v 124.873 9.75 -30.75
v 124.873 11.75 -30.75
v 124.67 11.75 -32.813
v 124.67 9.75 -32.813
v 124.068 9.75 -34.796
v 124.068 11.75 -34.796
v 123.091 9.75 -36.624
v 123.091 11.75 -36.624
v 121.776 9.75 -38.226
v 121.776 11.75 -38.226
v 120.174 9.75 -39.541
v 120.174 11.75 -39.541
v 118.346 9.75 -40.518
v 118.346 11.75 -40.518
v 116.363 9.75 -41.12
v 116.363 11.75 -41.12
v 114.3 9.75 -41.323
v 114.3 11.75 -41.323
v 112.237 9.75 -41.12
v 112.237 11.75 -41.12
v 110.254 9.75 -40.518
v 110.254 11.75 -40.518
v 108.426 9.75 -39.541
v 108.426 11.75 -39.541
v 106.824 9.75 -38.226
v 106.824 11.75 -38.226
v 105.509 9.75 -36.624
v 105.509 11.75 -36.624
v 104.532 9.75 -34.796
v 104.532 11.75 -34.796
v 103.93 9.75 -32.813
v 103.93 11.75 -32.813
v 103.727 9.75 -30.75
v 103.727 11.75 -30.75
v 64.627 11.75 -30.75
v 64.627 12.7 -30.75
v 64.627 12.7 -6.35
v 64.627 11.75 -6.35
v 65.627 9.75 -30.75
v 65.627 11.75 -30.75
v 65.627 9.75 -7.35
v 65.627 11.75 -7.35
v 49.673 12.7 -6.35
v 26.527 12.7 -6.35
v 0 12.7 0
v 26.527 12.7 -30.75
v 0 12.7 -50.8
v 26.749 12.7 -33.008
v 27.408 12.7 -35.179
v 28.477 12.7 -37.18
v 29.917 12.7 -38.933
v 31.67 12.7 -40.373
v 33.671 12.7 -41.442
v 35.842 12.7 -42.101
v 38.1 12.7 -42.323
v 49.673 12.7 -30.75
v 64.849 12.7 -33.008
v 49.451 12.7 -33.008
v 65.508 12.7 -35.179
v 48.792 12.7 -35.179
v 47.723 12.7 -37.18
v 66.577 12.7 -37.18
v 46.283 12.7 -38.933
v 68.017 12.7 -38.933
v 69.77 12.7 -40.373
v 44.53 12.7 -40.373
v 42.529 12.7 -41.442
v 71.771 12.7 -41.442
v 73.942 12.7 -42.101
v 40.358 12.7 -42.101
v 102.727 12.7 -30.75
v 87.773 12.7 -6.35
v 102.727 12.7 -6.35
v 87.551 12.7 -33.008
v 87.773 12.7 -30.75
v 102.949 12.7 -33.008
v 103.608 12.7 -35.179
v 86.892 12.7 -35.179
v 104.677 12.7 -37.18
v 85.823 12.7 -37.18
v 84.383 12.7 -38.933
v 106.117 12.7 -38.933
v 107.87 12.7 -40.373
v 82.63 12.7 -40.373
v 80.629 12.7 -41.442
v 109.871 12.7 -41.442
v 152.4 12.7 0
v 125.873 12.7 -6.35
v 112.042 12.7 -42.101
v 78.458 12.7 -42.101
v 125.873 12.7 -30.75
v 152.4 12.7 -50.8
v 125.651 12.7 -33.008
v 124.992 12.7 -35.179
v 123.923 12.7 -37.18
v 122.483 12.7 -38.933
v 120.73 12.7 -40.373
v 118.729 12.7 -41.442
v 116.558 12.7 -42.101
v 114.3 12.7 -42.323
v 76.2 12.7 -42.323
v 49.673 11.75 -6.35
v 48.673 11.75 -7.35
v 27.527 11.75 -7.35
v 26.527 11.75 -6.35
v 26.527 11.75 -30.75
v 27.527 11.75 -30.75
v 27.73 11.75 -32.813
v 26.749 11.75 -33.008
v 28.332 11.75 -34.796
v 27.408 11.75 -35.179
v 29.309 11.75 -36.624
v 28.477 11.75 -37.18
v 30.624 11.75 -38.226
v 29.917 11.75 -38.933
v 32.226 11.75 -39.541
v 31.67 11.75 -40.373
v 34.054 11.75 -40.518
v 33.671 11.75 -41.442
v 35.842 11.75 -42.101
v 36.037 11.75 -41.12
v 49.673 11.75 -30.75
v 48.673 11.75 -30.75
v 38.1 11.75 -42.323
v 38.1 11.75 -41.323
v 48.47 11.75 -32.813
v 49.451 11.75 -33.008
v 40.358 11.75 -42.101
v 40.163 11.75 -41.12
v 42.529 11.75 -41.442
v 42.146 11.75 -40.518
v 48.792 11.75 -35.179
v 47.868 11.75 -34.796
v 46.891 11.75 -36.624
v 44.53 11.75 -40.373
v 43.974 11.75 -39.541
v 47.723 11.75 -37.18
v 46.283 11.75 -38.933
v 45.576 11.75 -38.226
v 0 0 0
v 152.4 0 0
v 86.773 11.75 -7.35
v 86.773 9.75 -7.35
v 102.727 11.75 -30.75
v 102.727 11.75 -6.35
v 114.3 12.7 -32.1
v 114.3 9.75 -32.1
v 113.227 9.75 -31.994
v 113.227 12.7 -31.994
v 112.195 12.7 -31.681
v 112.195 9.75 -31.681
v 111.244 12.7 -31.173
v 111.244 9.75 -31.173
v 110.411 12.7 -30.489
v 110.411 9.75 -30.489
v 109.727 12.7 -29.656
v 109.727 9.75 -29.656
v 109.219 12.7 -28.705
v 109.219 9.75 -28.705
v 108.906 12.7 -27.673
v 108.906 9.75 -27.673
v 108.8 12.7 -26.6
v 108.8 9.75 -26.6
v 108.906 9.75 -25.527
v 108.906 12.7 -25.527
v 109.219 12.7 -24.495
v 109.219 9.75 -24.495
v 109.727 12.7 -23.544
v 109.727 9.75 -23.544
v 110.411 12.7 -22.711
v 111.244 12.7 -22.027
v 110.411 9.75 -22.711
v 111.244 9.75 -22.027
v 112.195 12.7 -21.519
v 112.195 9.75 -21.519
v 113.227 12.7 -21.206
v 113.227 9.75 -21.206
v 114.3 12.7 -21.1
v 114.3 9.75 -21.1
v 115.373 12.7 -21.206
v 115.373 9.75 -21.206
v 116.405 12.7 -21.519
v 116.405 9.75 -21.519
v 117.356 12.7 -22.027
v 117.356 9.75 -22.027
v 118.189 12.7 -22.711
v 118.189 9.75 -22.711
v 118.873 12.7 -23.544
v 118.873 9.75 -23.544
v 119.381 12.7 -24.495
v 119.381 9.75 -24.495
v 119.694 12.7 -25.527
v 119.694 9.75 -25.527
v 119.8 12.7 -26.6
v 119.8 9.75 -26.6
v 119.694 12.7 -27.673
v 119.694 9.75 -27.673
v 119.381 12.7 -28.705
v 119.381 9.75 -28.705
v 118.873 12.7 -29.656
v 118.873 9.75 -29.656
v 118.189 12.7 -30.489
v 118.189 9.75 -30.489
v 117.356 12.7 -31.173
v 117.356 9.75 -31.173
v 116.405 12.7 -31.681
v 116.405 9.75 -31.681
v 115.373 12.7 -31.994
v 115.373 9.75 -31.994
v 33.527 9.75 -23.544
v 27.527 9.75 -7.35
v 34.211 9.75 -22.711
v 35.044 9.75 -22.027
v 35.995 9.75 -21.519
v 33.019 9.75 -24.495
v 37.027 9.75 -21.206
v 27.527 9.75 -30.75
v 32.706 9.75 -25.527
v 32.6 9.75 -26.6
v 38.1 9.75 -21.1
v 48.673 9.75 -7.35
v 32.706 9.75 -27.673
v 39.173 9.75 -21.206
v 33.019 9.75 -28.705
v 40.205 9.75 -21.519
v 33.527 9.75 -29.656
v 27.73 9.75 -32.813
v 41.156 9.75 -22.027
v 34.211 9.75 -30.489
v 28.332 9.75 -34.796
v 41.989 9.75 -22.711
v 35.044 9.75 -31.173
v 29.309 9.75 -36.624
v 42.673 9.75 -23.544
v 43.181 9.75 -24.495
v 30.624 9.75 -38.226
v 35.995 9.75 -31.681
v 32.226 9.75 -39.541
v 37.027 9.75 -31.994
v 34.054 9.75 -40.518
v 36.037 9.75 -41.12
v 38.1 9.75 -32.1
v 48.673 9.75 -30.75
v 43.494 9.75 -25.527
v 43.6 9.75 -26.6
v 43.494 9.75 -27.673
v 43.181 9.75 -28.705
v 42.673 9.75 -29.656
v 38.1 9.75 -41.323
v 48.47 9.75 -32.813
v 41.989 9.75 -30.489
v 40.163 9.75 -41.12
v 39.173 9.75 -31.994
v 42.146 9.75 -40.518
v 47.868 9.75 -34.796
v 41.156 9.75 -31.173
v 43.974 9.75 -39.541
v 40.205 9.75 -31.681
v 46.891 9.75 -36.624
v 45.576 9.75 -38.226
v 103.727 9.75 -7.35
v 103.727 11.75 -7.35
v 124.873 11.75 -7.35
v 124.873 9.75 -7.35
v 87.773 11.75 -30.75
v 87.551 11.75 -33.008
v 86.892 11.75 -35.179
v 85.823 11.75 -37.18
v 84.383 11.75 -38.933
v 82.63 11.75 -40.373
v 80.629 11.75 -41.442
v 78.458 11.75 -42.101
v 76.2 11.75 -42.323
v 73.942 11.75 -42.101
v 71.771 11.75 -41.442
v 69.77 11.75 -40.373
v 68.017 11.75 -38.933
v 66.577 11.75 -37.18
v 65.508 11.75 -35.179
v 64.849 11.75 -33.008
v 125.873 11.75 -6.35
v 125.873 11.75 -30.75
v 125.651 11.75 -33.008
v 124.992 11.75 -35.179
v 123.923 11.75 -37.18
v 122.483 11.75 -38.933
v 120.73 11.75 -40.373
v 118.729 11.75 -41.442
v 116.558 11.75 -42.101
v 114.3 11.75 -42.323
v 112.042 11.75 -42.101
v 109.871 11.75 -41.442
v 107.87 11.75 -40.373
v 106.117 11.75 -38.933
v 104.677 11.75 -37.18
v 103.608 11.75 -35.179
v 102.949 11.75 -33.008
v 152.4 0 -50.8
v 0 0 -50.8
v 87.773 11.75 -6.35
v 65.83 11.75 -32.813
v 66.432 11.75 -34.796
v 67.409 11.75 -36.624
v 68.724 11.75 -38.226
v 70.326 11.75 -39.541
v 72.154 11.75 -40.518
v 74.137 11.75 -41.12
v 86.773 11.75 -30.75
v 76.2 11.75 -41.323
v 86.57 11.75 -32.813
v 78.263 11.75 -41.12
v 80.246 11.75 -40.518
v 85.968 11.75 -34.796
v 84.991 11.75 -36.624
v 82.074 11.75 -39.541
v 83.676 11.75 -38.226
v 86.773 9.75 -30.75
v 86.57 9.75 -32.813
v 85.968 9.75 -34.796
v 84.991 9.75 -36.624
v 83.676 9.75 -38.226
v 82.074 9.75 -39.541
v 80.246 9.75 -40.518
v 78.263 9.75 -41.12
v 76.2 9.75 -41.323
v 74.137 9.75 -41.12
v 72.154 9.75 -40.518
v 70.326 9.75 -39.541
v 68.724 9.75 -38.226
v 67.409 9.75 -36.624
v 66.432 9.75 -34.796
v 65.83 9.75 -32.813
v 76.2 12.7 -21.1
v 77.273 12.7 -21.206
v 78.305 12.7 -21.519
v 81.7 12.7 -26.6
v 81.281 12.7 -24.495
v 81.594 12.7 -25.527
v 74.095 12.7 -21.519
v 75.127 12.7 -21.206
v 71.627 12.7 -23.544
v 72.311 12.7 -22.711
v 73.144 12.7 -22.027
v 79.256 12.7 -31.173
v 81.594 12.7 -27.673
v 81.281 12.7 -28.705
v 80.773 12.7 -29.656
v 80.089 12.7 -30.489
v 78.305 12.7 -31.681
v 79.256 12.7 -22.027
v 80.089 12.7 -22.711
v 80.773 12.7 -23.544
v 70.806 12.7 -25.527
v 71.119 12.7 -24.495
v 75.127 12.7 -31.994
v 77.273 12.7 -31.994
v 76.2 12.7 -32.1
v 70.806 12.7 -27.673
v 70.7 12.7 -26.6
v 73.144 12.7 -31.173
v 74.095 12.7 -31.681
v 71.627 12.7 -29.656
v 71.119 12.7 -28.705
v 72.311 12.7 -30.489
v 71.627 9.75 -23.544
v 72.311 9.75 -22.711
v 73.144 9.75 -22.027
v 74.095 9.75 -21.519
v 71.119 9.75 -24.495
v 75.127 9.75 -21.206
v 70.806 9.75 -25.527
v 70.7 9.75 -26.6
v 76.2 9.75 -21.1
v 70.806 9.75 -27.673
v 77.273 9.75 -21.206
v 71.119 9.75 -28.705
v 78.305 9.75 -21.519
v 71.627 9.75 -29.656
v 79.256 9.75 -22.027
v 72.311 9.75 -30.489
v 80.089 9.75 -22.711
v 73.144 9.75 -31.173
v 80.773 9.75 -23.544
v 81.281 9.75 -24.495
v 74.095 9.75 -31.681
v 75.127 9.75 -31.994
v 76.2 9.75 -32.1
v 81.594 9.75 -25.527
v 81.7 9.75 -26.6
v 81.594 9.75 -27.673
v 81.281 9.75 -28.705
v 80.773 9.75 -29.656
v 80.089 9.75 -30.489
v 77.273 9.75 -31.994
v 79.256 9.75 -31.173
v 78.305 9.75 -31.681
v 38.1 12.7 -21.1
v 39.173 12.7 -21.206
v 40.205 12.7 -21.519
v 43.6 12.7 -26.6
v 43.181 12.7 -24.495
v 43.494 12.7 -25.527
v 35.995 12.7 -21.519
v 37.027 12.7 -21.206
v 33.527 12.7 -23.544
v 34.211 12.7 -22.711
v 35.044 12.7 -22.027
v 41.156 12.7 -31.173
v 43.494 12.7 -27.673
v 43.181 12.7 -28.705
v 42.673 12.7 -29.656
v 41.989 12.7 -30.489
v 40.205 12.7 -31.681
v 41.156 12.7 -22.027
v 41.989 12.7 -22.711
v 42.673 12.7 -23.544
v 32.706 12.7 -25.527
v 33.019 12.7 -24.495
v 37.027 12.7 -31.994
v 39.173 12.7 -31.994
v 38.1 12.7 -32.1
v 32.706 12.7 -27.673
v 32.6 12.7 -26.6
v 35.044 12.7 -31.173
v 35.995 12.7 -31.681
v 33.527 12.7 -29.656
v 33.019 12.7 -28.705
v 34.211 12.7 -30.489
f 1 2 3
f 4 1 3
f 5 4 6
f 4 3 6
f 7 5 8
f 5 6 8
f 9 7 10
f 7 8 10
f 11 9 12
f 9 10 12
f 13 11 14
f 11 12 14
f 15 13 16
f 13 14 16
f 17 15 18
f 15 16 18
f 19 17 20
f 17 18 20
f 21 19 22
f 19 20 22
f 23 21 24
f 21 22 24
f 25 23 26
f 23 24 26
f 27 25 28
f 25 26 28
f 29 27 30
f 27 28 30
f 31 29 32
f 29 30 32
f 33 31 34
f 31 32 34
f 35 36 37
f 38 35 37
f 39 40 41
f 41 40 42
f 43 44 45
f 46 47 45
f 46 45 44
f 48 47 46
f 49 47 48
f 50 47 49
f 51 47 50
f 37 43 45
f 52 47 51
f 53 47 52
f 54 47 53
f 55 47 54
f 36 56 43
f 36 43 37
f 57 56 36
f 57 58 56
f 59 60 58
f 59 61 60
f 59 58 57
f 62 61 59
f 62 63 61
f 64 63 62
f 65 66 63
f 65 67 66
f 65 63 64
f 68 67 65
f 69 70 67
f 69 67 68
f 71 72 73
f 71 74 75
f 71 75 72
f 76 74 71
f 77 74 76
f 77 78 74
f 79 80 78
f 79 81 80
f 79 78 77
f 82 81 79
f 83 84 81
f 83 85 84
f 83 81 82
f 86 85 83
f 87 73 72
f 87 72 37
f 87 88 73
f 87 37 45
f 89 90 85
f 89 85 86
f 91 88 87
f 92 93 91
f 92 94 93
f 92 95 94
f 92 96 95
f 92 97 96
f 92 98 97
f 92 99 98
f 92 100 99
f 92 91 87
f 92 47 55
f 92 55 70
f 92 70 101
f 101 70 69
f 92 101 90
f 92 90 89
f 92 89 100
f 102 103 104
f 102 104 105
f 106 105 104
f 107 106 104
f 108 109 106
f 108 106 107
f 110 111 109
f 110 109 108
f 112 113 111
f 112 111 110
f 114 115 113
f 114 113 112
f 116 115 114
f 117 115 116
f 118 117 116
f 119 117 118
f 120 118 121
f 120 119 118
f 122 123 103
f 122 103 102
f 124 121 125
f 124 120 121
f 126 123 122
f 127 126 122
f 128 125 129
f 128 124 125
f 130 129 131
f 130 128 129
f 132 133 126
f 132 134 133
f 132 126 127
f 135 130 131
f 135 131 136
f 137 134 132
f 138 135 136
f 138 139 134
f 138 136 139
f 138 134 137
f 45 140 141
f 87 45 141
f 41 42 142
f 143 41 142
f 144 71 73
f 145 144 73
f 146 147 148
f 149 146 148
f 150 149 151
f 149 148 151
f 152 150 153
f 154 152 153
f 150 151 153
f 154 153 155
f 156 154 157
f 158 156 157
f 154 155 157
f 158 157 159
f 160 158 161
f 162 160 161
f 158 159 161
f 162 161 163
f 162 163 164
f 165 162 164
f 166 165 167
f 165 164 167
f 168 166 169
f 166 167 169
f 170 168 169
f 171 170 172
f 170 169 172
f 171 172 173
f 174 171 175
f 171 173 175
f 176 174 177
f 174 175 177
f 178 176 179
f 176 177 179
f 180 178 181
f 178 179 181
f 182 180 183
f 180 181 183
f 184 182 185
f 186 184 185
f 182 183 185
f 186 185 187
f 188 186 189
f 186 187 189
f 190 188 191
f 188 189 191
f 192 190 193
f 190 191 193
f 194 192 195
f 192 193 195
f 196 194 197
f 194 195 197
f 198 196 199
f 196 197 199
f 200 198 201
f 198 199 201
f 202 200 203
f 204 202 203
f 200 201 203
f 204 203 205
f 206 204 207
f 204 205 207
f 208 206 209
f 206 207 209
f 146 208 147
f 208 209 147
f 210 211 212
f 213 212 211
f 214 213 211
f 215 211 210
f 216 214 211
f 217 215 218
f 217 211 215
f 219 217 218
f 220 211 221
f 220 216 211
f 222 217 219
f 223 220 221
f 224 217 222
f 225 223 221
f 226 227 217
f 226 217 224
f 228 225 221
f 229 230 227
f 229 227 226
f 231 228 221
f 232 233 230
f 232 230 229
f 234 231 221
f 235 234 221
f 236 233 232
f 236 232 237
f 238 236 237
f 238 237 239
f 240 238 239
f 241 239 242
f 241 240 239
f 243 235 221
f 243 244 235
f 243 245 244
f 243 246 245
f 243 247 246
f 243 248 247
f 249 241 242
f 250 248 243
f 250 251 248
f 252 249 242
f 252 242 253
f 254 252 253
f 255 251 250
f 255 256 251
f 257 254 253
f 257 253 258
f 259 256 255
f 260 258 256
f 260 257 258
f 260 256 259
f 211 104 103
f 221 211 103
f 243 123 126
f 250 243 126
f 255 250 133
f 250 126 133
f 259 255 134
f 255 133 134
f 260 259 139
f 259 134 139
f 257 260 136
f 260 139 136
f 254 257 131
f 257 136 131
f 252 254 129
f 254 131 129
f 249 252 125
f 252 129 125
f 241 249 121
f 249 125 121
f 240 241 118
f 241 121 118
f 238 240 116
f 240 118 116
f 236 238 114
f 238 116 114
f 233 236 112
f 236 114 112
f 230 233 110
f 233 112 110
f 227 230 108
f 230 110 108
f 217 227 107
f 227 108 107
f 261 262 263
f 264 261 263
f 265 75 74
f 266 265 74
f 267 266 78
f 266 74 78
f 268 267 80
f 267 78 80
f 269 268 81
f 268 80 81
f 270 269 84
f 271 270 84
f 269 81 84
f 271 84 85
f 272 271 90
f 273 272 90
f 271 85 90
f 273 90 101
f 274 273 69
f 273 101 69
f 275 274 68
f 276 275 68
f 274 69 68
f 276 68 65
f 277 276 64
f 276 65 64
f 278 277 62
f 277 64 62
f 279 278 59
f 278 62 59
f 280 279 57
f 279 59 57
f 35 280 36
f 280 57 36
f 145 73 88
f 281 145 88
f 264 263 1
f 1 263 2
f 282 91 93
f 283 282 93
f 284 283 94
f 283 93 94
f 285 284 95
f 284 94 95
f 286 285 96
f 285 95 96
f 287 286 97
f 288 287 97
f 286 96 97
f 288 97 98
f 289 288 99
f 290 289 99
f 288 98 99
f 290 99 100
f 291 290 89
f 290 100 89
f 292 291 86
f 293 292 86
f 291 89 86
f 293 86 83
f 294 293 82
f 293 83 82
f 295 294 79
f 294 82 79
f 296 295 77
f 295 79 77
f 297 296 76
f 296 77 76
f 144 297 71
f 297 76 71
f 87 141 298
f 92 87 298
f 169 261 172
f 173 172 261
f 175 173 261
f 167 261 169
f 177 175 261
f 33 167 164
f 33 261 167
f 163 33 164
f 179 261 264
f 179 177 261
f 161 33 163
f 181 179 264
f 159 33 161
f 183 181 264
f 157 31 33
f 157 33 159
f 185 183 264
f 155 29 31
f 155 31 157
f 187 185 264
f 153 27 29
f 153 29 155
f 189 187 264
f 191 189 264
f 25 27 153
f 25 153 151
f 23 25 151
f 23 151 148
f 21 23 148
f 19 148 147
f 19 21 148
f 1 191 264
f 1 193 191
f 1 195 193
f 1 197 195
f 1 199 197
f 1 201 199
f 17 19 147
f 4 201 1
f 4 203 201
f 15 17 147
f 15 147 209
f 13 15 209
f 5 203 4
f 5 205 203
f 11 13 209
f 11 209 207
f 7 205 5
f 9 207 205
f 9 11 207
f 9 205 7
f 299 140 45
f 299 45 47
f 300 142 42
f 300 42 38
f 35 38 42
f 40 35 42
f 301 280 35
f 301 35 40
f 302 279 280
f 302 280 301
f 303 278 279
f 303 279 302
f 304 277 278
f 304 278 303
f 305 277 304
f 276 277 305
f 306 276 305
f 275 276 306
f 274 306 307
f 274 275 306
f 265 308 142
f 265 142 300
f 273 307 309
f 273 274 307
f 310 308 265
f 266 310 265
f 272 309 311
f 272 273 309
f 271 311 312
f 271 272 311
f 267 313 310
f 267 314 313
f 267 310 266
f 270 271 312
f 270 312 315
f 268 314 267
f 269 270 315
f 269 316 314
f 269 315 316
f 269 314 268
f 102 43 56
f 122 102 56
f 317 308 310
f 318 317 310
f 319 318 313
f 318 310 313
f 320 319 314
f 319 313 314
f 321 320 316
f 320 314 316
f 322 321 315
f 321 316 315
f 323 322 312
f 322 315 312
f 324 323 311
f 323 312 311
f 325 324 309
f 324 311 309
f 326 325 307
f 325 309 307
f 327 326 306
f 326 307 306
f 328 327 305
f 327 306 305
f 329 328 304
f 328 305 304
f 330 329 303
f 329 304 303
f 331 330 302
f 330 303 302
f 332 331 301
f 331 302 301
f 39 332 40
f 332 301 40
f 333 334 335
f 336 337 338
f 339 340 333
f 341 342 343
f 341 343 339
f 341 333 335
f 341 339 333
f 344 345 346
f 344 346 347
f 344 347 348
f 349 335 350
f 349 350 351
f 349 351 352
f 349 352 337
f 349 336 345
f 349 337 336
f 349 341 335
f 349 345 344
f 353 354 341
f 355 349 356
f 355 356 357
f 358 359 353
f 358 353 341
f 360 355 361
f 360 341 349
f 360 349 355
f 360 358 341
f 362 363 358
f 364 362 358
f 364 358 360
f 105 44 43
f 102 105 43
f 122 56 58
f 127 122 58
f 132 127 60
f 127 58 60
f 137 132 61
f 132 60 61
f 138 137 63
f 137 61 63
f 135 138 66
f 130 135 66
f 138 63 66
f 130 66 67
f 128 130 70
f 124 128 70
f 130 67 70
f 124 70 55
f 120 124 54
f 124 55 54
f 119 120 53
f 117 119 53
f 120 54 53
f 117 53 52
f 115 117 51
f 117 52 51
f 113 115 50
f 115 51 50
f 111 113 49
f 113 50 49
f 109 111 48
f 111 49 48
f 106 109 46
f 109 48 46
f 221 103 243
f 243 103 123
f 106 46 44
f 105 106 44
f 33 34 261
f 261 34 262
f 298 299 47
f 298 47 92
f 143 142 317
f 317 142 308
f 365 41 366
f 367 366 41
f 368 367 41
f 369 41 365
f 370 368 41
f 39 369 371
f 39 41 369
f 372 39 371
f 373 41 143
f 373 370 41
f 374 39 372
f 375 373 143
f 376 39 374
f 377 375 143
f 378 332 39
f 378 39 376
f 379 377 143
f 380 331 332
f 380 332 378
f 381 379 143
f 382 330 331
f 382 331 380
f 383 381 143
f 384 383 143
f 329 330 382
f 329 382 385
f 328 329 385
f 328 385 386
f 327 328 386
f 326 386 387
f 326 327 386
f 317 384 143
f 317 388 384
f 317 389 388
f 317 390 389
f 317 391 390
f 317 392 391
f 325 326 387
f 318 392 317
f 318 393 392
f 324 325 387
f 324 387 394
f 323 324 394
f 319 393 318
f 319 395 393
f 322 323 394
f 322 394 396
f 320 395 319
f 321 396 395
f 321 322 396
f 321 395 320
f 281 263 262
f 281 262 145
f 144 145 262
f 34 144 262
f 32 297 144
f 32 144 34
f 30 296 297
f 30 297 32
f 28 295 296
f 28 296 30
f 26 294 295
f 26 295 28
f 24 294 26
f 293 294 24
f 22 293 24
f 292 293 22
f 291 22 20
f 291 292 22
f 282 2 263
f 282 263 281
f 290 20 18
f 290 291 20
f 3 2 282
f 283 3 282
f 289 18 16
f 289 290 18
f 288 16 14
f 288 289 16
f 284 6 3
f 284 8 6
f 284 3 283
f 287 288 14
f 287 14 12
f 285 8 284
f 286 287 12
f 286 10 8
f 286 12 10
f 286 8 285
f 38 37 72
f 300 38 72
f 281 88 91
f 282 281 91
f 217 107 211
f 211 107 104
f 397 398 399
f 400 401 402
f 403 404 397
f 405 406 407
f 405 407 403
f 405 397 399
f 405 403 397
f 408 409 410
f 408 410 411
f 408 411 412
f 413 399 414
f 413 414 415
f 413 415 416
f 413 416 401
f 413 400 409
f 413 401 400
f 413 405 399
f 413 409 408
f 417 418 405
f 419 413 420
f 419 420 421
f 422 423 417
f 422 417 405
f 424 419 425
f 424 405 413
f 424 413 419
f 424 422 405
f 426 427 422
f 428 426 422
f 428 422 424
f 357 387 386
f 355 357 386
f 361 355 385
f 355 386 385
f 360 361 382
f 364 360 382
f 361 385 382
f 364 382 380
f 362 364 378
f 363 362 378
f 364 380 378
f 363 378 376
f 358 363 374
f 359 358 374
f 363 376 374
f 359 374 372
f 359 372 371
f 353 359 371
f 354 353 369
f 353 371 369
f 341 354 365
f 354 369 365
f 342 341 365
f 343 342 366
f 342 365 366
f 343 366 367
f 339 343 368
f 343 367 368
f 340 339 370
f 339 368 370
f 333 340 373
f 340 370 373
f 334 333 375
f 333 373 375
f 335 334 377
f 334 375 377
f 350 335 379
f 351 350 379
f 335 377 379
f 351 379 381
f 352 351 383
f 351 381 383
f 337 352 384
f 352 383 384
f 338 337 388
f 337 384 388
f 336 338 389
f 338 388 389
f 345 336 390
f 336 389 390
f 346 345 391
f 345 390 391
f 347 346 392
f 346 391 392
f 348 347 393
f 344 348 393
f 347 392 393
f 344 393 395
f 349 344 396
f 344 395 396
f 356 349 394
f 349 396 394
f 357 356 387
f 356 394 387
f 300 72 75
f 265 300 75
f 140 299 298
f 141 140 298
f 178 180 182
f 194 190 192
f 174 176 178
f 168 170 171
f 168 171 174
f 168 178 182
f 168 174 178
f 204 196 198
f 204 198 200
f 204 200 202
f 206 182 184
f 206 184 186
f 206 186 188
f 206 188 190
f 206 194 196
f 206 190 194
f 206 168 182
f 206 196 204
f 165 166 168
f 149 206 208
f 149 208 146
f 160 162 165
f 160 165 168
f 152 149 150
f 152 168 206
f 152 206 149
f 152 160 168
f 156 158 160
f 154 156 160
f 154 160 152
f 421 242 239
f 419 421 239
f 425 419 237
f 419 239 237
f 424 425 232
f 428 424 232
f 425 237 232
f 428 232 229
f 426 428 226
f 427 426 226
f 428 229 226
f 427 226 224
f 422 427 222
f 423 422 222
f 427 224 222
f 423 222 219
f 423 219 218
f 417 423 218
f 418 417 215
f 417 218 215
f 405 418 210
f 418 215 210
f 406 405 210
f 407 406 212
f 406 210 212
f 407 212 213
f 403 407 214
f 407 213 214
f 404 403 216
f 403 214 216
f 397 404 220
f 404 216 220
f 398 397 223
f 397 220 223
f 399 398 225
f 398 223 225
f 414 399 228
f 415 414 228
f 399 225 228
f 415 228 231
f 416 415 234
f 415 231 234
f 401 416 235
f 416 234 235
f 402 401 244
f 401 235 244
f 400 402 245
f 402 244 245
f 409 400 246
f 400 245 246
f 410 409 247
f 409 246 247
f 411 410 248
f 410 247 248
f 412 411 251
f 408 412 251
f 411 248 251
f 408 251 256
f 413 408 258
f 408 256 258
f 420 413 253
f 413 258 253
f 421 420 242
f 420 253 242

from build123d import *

# Parameters (mm, degrees)
SKETCH1_W            = 152.4
SKETCH1_H            = 50.8
BOSS_EXTRUDE1_DEPTH  = 12.7
CUT_EXTRUDE1_DEPTH   = 0.95
CUT_EXTRUDE2_DEPTH   = 2
SKETCH4_R            = 5.5
BOSS_EXTRUDE2_DEPTH  = 2.95
LPATTERN1_COUNT      = 2
LPATTERN1_PITCH      = 38.1
LPATTERN1_COUNT_DIR2 = 2
LPATTERN1_PITCH_DIR2 = 38.1


with BuildPart() as part:
    # Sketch1 → Boss-Extrude1 (new body)
    with BuildSketch(Plane(origin=(0, 0, 0), x_dir=(1, 0, 0), z_dir=(0, 1, 0))):
        with Locations((76.2, 25.4)):
            Rectangle(SKETCH1_W, SKETCH1_H)
    extrude(amount=BOSS_EXTRUDE1_DEPTH)

    # Sketch2 → Cut-Extrude1 (cut)
    with BuildSketch(Plane(origin=(0, 12.7, 0), x_dir=(1, 0, 0), z_dir=(0, 1, 0))):
        with BuildLine():
            Line((64.626998, 30.75), (64.626998, 6.35))
            Line((64.626998, 6.35), (87.773002, 6.35))
            Line((87.773002, 6.35), (87.773002, 30.75))
            ThreePointArc((87.773002, 30.75), (76.2, 42.323002), (64.626998, 30.75))
        make_face()
    cut_extrude1 = extrude(amount=-CUT_EXTRUDE1_DEPTH, mode=Mode.SUBTRACT)

    # Sketch3 → Cut-Extrude2 (cut)
    with BuildSketch(Plane(origin=(0, 11.75, 0), x_dir=(1, 0, 0), z_dir=(0, 1, 0))):
        with BuildLine():
            Line((65.626998, 30.75), (65.626998, 7.35))
            Line((65.626998, 7.35), (86.773002, 7.35))
            Line((86.773002, 7.35), (86.773002, 30.75))
            ThreePointArc((86.773002, 30.75), (76.2, 41.323002), (65.626998, 30.75))
        make_face()
    cut_extrude2 = extrude(amount=-CUT_EXTRUDE2_DEPTH, mode=Mode.SUBTRACT)

    # Sketch4 → Boss-Extrude2 (add)
    with BuildSketch(Plane(origin=(0, 9.75, 0), x_dir=(1, 0, 0), z_dir=(0, 1, 0))):
        with Locations(Location((76.2, 26.6, 0), (0, 0, 90))):
            Circle(SKETCH4_R)
    boss_extrude2 = extrude(amount=BOSS_EXTRUDE2_DEPTH)

    # LPattern1: Cut-Extrude1, Cut-Extrude2, Boss-Extrude2 2 × 2
    with Locations(*[Vector(1, 0, 0) * (i * LPATTERN1_PITCH) + Vector(-1, 0, 0) * (j * LPATTERN1_PITCH_DIR2) for i in range(LPATTERN1_COUNT) for j in range(LPATTERN1_COUNT_DIR2) if (i, j) != (0, 0)]):
        add(cut_extrude1, mode=Mode.SUBTRACT)
        add(cut_extrude2, mode=Mode.SUBTRACT)
        add(boss_extrude2)


solid = part.part
